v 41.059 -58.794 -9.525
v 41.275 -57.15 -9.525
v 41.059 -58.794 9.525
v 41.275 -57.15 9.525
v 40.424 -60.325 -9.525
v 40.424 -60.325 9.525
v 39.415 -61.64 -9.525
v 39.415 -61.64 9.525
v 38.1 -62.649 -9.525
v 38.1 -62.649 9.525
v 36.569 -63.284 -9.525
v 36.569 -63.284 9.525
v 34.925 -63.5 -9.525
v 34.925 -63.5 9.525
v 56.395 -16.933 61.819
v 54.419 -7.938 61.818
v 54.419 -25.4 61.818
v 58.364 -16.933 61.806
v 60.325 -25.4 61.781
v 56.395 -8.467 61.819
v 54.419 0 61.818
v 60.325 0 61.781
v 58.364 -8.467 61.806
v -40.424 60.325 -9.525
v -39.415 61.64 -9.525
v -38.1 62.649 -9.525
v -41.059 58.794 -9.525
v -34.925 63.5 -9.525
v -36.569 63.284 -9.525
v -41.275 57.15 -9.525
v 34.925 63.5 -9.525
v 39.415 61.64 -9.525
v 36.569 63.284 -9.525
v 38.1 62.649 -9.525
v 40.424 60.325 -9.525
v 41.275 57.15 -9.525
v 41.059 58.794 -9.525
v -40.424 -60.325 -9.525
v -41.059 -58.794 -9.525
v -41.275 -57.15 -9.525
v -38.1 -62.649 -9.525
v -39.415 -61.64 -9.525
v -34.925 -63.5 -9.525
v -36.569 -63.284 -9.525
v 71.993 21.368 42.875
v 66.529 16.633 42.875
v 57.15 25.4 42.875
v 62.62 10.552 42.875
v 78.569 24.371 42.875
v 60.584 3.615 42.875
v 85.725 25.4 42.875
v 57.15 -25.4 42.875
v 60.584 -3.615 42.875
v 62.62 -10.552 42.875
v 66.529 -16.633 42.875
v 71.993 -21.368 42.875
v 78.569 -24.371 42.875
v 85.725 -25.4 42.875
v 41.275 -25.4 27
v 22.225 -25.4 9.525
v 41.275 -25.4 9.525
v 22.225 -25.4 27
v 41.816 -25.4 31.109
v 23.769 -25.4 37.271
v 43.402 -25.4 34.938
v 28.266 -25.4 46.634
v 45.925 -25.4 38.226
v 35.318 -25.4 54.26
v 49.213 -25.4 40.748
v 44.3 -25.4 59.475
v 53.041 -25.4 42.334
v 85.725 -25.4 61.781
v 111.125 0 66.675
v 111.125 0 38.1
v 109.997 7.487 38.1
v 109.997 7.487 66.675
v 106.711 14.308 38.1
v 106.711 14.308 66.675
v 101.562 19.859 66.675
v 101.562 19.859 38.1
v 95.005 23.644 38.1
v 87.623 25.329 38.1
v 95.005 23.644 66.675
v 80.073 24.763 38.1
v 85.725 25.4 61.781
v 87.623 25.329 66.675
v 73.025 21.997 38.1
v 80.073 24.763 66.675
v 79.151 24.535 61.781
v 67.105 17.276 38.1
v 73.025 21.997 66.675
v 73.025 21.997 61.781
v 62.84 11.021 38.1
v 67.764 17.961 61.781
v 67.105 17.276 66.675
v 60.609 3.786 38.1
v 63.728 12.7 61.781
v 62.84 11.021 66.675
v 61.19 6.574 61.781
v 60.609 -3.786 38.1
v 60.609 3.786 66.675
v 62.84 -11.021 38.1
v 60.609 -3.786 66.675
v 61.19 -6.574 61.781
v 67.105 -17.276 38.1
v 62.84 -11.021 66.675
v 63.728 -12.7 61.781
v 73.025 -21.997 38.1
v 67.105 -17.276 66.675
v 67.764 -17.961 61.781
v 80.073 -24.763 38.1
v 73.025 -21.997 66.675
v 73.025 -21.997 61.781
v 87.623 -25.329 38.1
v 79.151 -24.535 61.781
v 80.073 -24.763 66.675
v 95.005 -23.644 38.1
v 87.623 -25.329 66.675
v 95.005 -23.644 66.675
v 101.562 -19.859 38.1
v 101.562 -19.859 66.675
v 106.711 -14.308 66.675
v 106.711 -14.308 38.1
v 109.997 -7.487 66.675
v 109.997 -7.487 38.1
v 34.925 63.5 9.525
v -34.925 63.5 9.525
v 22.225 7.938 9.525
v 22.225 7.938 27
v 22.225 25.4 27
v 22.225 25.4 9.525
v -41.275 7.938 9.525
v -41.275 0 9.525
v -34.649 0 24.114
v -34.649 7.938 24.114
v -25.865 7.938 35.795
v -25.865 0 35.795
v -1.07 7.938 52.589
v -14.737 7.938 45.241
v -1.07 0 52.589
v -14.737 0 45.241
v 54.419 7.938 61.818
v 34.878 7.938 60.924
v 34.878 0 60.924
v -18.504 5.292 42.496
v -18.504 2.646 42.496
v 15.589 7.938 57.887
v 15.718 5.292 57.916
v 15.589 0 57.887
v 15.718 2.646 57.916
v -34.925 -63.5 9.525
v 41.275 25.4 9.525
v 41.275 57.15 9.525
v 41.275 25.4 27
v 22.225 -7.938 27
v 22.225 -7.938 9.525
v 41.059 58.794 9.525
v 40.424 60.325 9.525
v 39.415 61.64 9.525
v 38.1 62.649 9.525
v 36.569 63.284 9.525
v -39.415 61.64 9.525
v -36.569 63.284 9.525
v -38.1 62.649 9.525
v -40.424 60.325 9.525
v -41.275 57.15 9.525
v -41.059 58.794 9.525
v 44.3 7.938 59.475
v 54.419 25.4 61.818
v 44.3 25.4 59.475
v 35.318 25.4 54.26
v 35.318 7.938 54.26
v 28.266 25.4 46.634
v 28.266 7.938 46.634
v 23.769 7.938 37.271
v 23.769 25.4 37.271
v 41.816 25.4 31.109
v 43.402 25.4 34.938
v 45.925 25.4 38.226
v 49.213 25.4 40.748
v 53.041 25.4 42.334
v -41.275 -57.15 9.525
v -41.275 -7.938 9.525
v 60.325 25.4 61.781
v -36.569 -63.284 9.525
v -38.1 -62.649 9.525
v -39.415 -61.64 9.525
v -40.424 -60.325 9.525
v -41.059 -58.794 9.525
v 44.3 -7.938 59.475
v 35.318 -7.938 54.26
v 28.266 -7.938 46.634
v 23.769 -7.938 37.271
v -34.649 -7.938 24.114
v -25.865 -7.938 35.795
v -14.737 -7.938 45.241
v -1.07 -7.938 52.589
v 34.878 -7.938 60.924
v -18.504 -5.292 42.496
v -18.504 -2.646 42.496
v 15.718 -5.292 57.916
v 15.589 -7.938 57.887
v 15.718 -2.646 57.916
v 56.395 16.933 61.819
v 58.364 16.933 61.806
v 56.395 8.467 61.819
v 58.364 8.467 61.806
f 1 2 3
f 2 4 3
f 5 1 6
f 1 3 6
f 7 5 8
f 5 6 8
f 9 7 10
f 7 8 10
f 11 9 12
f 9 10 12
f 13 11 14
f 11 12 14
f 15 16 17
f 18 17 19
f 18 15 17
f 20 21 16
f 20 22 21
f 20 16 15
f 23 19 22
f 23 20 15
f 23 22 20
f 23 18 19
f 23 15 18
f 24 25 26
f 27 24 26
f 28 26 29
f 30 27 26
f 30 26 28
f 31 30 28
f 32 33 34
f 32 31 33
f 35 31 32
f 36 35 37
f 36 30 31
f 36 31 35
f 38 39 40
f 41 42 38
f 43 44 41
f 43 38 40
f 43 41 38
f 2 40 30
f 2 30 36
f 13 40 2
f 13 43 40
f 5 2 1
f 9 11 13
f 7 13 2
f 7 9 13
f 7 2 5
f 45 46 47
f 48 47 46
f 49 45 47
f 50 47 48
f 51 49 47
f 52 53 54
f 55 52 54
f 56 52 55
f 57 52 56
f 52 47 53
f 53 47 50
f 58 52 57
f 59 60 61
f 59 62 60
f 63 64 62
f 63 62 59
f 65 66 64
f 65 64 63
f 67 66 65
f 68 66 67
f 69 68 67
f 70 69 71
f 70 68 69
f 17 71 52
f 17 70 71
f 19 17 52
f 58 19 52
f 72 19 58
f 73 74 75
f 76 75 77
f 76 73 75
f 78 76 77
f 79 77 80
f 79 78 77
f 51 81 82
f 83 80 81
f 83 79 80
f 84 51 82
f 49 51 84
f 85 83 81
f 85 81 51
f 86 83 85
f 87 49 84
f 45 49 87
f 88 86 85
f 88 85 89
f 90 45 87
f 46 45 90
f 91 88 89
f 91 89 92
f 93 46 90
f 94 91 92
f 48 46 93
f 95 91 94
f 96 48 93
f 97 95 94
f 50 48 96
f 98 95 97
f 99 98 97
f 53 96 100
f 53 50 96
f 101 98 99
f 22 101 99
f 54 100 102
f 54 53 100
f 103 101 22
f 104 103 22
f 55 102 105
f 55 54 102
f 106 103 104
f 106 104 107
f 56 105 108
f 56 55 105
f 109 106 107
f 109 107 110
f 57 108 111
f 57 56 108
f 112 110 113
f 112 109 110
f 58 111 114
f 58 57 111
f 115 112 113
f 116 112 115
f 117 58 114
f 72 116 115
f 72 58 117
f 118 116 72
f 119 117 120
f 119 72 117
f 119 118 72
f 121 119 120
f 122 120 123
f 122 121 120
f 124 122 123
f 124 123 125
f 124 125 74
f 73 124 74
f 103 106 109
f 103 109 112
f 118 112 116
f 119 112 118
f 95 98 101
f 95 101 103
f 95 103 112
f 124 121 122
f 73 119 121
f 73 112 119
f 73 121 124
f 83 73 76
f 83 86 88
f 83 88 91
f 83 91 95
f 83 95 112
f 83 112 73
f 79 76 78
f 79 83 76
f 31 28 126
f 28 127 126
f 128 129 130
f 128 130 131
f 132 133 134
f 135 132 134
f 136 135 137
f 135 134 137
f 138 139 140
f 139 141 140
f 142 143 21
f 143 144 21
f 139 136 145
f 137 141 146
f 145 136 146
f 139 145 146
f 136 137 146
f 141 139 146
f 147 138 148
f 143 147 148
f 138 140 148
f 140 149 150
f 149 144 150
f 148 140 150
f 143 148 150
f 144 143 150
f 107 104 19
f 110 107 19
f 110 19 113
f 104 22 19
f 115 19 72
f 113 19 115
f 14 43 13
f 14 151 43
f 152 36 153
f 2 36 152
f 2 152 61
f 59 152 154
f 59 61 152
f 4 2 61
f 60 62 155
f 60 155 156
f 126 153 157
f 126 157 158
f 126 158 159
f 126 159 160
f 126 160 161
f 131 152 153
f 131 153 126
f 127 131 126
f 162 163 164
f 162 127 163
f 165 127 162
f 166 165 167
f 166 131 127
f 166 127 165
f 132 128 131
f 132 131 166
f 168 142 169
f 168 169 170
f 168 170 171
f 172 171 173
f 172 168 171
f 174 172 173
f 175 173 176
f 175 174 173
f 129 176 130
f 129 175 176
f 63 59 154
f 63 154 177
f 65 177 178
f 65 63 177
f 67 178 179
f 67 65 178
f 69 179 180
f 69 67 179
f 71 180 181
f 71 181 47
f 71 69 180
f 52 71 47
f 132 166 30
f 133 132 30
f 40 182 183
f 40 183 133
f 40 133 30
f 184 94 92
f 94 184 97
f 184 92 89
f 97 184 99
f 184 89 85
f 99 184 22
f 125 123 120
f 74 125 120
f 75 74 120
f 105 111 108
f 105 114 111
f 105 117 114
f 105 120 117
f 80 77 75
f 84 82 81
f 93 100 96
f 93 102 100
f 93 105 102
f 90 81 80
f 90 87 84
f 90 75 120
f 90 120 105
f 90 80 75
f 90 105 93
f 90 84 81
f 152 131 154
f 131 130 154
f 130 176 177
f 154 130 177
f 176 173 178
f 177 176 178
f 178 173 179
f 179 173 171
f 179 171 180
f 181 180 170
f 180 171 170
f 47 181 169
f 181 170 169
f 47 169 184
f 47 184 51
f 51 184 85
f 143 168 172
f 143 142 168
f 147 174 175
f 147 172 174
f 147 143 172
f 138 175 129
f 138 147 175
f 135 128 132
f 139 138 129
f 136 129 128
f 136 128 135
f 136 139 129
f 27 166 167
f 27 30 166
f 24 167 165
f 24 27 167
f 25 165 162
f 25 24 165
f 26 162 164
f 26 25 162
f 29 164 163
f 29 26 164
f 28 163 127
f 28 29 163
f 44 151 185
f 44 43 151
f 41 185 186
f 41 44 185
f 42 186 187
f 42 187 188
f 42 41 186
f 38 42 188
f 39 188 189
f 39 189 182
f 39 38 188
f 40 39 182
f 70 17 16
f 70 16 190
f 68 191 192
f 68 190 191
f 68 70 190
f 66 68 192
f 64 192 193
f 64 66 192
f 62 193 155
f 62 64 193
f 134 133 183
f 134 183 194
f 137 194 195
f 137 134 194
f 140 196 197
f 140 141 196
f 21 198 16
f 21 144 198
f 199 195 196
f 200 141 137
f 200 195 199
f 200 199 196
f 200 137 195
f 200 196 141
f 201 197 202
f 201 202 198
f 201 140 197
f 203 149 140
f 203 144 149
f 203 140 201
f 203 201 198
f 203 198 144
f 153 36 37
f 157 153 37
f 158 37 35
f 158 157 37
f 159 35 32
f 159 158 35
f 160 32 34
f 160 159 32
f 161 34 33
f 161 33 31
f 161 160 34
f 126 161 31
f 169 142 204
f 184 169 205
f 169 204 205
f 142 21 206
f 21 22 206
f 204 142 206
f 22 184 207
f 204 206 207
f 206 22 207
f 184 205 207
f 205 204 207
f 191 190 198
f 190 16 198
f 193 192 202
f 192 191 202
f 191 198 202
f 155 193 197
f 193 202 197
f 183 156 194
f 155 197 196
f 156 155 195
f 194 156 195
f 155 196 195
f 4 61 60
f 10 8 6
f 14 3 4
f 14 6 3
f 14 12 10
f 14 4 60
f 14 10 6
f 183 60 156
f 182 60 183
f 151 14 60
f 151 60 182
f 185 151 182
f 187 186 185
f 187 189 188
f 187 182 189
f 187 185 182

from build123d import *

# Parameters (mm, degrees)
F1_DEPTH = 63.5
F0_W     = 25.4
F0_H     = 18.905382
F2_DEPTH = 25.4
F3_DEPTH = 7.9375
F5_R     = 6.35


with BuildPart() as f1:
    # F0 (on Front) → F1 (new body, symmetric)
    with BuildSketch(Plane.XZ):
        Polygon((-41.275, -9.525), (41.275, -9.525), (41.275, 9.525), (22.225, 9.525), (-41.275, 9.525), align=None)
    extrude(amount=F1_DEPTH, both=True)

    # F0 (on Front) → F2 (join, symmetric)
    with BuildSketch(Plane.XZ):
        with BuildLine():
            Line((22.225, 9.525), (41.275, 9.525))
            Line((41.275, 9.525), (41.275, 27.0002))
            ThreePointArc((41.275, 27.0002), (45.92468, 38.22552), (57.15, 42.8752))
            Line((57.15, 42.8752), (60.325, 42.8752))
            Line((60.325, 42.8752), (60.325, 61.780582))
            add(Edge.make_bspline(
                [(54.418618, 61.818229), (56.398661, 61.826097), (58.368865, 61.812328), (60.325, 61.780582)],
                knots=[108.678024, 108.678024, 108.678024, 108.678024, 114.250628, 114.250628, 114.250628, 114.250628], degree=3))
            ThreePointArc((54.418618, 61.818229), (31.506783, 50.710557), (22.225, 27.0002))
            Line((22.225, 27.0002), (22.225, 9.525))
        make_face()
        with Locations((73.025, 52.327891)):
            Rectangle(F0_W, F0_H)
    extrude(amount=F2_DEPTH, both=True)

    # F0 (on Front) → F3 (join, symmetric)
    with BuildSketch(Plane.XZ):
        with BuildLine():
            add(Edge.make_bspline(
                [(-41.275, 9.525), (-26.553893, 53.282353), (15.803419, 61.664801), (54.418618, 61.818229)],
                knots=[0, 0, 0, 0, 108.678024, 108.678024, 108.678024, 108.678024], degree=3))
            Line((-41.275, 9.525), (22.225, 9.525))
            Line((22.225, 9.525), (22.225, 27.0002))
            ThreePointArc((22.225, 27.0002), (31.506783, 50.710557), (54.418618, 61.818229))
        make_face()
    extrude(amount=F3_DEPTH, both=True)

    # F0 (on Front) → F4 (revolve)
    with BuildSketch(Plane.XZ):
        Polygon((85.725, 66.675), (85.725, 61.780582), (85.725, 42.8752), (85.725, 38.1), (111.125, 38.1), (111.125, 66.675), align=None)
    revolve(axis=Axis((85.725, 0, 52.3875), (0, 0, 1)))

    # F5
    f5_edges = [f1.edges().sort_by_distance(p)[0] for p in [
        (41.275, -63.5, 0),
        (-41.275, -63.5, 0),
        (-41.275, 63.5, 0),
        (41.275, 63.5, 0),
    ]]
    fillet(f5_edges, radius=F5_R)


solid = f1.part
